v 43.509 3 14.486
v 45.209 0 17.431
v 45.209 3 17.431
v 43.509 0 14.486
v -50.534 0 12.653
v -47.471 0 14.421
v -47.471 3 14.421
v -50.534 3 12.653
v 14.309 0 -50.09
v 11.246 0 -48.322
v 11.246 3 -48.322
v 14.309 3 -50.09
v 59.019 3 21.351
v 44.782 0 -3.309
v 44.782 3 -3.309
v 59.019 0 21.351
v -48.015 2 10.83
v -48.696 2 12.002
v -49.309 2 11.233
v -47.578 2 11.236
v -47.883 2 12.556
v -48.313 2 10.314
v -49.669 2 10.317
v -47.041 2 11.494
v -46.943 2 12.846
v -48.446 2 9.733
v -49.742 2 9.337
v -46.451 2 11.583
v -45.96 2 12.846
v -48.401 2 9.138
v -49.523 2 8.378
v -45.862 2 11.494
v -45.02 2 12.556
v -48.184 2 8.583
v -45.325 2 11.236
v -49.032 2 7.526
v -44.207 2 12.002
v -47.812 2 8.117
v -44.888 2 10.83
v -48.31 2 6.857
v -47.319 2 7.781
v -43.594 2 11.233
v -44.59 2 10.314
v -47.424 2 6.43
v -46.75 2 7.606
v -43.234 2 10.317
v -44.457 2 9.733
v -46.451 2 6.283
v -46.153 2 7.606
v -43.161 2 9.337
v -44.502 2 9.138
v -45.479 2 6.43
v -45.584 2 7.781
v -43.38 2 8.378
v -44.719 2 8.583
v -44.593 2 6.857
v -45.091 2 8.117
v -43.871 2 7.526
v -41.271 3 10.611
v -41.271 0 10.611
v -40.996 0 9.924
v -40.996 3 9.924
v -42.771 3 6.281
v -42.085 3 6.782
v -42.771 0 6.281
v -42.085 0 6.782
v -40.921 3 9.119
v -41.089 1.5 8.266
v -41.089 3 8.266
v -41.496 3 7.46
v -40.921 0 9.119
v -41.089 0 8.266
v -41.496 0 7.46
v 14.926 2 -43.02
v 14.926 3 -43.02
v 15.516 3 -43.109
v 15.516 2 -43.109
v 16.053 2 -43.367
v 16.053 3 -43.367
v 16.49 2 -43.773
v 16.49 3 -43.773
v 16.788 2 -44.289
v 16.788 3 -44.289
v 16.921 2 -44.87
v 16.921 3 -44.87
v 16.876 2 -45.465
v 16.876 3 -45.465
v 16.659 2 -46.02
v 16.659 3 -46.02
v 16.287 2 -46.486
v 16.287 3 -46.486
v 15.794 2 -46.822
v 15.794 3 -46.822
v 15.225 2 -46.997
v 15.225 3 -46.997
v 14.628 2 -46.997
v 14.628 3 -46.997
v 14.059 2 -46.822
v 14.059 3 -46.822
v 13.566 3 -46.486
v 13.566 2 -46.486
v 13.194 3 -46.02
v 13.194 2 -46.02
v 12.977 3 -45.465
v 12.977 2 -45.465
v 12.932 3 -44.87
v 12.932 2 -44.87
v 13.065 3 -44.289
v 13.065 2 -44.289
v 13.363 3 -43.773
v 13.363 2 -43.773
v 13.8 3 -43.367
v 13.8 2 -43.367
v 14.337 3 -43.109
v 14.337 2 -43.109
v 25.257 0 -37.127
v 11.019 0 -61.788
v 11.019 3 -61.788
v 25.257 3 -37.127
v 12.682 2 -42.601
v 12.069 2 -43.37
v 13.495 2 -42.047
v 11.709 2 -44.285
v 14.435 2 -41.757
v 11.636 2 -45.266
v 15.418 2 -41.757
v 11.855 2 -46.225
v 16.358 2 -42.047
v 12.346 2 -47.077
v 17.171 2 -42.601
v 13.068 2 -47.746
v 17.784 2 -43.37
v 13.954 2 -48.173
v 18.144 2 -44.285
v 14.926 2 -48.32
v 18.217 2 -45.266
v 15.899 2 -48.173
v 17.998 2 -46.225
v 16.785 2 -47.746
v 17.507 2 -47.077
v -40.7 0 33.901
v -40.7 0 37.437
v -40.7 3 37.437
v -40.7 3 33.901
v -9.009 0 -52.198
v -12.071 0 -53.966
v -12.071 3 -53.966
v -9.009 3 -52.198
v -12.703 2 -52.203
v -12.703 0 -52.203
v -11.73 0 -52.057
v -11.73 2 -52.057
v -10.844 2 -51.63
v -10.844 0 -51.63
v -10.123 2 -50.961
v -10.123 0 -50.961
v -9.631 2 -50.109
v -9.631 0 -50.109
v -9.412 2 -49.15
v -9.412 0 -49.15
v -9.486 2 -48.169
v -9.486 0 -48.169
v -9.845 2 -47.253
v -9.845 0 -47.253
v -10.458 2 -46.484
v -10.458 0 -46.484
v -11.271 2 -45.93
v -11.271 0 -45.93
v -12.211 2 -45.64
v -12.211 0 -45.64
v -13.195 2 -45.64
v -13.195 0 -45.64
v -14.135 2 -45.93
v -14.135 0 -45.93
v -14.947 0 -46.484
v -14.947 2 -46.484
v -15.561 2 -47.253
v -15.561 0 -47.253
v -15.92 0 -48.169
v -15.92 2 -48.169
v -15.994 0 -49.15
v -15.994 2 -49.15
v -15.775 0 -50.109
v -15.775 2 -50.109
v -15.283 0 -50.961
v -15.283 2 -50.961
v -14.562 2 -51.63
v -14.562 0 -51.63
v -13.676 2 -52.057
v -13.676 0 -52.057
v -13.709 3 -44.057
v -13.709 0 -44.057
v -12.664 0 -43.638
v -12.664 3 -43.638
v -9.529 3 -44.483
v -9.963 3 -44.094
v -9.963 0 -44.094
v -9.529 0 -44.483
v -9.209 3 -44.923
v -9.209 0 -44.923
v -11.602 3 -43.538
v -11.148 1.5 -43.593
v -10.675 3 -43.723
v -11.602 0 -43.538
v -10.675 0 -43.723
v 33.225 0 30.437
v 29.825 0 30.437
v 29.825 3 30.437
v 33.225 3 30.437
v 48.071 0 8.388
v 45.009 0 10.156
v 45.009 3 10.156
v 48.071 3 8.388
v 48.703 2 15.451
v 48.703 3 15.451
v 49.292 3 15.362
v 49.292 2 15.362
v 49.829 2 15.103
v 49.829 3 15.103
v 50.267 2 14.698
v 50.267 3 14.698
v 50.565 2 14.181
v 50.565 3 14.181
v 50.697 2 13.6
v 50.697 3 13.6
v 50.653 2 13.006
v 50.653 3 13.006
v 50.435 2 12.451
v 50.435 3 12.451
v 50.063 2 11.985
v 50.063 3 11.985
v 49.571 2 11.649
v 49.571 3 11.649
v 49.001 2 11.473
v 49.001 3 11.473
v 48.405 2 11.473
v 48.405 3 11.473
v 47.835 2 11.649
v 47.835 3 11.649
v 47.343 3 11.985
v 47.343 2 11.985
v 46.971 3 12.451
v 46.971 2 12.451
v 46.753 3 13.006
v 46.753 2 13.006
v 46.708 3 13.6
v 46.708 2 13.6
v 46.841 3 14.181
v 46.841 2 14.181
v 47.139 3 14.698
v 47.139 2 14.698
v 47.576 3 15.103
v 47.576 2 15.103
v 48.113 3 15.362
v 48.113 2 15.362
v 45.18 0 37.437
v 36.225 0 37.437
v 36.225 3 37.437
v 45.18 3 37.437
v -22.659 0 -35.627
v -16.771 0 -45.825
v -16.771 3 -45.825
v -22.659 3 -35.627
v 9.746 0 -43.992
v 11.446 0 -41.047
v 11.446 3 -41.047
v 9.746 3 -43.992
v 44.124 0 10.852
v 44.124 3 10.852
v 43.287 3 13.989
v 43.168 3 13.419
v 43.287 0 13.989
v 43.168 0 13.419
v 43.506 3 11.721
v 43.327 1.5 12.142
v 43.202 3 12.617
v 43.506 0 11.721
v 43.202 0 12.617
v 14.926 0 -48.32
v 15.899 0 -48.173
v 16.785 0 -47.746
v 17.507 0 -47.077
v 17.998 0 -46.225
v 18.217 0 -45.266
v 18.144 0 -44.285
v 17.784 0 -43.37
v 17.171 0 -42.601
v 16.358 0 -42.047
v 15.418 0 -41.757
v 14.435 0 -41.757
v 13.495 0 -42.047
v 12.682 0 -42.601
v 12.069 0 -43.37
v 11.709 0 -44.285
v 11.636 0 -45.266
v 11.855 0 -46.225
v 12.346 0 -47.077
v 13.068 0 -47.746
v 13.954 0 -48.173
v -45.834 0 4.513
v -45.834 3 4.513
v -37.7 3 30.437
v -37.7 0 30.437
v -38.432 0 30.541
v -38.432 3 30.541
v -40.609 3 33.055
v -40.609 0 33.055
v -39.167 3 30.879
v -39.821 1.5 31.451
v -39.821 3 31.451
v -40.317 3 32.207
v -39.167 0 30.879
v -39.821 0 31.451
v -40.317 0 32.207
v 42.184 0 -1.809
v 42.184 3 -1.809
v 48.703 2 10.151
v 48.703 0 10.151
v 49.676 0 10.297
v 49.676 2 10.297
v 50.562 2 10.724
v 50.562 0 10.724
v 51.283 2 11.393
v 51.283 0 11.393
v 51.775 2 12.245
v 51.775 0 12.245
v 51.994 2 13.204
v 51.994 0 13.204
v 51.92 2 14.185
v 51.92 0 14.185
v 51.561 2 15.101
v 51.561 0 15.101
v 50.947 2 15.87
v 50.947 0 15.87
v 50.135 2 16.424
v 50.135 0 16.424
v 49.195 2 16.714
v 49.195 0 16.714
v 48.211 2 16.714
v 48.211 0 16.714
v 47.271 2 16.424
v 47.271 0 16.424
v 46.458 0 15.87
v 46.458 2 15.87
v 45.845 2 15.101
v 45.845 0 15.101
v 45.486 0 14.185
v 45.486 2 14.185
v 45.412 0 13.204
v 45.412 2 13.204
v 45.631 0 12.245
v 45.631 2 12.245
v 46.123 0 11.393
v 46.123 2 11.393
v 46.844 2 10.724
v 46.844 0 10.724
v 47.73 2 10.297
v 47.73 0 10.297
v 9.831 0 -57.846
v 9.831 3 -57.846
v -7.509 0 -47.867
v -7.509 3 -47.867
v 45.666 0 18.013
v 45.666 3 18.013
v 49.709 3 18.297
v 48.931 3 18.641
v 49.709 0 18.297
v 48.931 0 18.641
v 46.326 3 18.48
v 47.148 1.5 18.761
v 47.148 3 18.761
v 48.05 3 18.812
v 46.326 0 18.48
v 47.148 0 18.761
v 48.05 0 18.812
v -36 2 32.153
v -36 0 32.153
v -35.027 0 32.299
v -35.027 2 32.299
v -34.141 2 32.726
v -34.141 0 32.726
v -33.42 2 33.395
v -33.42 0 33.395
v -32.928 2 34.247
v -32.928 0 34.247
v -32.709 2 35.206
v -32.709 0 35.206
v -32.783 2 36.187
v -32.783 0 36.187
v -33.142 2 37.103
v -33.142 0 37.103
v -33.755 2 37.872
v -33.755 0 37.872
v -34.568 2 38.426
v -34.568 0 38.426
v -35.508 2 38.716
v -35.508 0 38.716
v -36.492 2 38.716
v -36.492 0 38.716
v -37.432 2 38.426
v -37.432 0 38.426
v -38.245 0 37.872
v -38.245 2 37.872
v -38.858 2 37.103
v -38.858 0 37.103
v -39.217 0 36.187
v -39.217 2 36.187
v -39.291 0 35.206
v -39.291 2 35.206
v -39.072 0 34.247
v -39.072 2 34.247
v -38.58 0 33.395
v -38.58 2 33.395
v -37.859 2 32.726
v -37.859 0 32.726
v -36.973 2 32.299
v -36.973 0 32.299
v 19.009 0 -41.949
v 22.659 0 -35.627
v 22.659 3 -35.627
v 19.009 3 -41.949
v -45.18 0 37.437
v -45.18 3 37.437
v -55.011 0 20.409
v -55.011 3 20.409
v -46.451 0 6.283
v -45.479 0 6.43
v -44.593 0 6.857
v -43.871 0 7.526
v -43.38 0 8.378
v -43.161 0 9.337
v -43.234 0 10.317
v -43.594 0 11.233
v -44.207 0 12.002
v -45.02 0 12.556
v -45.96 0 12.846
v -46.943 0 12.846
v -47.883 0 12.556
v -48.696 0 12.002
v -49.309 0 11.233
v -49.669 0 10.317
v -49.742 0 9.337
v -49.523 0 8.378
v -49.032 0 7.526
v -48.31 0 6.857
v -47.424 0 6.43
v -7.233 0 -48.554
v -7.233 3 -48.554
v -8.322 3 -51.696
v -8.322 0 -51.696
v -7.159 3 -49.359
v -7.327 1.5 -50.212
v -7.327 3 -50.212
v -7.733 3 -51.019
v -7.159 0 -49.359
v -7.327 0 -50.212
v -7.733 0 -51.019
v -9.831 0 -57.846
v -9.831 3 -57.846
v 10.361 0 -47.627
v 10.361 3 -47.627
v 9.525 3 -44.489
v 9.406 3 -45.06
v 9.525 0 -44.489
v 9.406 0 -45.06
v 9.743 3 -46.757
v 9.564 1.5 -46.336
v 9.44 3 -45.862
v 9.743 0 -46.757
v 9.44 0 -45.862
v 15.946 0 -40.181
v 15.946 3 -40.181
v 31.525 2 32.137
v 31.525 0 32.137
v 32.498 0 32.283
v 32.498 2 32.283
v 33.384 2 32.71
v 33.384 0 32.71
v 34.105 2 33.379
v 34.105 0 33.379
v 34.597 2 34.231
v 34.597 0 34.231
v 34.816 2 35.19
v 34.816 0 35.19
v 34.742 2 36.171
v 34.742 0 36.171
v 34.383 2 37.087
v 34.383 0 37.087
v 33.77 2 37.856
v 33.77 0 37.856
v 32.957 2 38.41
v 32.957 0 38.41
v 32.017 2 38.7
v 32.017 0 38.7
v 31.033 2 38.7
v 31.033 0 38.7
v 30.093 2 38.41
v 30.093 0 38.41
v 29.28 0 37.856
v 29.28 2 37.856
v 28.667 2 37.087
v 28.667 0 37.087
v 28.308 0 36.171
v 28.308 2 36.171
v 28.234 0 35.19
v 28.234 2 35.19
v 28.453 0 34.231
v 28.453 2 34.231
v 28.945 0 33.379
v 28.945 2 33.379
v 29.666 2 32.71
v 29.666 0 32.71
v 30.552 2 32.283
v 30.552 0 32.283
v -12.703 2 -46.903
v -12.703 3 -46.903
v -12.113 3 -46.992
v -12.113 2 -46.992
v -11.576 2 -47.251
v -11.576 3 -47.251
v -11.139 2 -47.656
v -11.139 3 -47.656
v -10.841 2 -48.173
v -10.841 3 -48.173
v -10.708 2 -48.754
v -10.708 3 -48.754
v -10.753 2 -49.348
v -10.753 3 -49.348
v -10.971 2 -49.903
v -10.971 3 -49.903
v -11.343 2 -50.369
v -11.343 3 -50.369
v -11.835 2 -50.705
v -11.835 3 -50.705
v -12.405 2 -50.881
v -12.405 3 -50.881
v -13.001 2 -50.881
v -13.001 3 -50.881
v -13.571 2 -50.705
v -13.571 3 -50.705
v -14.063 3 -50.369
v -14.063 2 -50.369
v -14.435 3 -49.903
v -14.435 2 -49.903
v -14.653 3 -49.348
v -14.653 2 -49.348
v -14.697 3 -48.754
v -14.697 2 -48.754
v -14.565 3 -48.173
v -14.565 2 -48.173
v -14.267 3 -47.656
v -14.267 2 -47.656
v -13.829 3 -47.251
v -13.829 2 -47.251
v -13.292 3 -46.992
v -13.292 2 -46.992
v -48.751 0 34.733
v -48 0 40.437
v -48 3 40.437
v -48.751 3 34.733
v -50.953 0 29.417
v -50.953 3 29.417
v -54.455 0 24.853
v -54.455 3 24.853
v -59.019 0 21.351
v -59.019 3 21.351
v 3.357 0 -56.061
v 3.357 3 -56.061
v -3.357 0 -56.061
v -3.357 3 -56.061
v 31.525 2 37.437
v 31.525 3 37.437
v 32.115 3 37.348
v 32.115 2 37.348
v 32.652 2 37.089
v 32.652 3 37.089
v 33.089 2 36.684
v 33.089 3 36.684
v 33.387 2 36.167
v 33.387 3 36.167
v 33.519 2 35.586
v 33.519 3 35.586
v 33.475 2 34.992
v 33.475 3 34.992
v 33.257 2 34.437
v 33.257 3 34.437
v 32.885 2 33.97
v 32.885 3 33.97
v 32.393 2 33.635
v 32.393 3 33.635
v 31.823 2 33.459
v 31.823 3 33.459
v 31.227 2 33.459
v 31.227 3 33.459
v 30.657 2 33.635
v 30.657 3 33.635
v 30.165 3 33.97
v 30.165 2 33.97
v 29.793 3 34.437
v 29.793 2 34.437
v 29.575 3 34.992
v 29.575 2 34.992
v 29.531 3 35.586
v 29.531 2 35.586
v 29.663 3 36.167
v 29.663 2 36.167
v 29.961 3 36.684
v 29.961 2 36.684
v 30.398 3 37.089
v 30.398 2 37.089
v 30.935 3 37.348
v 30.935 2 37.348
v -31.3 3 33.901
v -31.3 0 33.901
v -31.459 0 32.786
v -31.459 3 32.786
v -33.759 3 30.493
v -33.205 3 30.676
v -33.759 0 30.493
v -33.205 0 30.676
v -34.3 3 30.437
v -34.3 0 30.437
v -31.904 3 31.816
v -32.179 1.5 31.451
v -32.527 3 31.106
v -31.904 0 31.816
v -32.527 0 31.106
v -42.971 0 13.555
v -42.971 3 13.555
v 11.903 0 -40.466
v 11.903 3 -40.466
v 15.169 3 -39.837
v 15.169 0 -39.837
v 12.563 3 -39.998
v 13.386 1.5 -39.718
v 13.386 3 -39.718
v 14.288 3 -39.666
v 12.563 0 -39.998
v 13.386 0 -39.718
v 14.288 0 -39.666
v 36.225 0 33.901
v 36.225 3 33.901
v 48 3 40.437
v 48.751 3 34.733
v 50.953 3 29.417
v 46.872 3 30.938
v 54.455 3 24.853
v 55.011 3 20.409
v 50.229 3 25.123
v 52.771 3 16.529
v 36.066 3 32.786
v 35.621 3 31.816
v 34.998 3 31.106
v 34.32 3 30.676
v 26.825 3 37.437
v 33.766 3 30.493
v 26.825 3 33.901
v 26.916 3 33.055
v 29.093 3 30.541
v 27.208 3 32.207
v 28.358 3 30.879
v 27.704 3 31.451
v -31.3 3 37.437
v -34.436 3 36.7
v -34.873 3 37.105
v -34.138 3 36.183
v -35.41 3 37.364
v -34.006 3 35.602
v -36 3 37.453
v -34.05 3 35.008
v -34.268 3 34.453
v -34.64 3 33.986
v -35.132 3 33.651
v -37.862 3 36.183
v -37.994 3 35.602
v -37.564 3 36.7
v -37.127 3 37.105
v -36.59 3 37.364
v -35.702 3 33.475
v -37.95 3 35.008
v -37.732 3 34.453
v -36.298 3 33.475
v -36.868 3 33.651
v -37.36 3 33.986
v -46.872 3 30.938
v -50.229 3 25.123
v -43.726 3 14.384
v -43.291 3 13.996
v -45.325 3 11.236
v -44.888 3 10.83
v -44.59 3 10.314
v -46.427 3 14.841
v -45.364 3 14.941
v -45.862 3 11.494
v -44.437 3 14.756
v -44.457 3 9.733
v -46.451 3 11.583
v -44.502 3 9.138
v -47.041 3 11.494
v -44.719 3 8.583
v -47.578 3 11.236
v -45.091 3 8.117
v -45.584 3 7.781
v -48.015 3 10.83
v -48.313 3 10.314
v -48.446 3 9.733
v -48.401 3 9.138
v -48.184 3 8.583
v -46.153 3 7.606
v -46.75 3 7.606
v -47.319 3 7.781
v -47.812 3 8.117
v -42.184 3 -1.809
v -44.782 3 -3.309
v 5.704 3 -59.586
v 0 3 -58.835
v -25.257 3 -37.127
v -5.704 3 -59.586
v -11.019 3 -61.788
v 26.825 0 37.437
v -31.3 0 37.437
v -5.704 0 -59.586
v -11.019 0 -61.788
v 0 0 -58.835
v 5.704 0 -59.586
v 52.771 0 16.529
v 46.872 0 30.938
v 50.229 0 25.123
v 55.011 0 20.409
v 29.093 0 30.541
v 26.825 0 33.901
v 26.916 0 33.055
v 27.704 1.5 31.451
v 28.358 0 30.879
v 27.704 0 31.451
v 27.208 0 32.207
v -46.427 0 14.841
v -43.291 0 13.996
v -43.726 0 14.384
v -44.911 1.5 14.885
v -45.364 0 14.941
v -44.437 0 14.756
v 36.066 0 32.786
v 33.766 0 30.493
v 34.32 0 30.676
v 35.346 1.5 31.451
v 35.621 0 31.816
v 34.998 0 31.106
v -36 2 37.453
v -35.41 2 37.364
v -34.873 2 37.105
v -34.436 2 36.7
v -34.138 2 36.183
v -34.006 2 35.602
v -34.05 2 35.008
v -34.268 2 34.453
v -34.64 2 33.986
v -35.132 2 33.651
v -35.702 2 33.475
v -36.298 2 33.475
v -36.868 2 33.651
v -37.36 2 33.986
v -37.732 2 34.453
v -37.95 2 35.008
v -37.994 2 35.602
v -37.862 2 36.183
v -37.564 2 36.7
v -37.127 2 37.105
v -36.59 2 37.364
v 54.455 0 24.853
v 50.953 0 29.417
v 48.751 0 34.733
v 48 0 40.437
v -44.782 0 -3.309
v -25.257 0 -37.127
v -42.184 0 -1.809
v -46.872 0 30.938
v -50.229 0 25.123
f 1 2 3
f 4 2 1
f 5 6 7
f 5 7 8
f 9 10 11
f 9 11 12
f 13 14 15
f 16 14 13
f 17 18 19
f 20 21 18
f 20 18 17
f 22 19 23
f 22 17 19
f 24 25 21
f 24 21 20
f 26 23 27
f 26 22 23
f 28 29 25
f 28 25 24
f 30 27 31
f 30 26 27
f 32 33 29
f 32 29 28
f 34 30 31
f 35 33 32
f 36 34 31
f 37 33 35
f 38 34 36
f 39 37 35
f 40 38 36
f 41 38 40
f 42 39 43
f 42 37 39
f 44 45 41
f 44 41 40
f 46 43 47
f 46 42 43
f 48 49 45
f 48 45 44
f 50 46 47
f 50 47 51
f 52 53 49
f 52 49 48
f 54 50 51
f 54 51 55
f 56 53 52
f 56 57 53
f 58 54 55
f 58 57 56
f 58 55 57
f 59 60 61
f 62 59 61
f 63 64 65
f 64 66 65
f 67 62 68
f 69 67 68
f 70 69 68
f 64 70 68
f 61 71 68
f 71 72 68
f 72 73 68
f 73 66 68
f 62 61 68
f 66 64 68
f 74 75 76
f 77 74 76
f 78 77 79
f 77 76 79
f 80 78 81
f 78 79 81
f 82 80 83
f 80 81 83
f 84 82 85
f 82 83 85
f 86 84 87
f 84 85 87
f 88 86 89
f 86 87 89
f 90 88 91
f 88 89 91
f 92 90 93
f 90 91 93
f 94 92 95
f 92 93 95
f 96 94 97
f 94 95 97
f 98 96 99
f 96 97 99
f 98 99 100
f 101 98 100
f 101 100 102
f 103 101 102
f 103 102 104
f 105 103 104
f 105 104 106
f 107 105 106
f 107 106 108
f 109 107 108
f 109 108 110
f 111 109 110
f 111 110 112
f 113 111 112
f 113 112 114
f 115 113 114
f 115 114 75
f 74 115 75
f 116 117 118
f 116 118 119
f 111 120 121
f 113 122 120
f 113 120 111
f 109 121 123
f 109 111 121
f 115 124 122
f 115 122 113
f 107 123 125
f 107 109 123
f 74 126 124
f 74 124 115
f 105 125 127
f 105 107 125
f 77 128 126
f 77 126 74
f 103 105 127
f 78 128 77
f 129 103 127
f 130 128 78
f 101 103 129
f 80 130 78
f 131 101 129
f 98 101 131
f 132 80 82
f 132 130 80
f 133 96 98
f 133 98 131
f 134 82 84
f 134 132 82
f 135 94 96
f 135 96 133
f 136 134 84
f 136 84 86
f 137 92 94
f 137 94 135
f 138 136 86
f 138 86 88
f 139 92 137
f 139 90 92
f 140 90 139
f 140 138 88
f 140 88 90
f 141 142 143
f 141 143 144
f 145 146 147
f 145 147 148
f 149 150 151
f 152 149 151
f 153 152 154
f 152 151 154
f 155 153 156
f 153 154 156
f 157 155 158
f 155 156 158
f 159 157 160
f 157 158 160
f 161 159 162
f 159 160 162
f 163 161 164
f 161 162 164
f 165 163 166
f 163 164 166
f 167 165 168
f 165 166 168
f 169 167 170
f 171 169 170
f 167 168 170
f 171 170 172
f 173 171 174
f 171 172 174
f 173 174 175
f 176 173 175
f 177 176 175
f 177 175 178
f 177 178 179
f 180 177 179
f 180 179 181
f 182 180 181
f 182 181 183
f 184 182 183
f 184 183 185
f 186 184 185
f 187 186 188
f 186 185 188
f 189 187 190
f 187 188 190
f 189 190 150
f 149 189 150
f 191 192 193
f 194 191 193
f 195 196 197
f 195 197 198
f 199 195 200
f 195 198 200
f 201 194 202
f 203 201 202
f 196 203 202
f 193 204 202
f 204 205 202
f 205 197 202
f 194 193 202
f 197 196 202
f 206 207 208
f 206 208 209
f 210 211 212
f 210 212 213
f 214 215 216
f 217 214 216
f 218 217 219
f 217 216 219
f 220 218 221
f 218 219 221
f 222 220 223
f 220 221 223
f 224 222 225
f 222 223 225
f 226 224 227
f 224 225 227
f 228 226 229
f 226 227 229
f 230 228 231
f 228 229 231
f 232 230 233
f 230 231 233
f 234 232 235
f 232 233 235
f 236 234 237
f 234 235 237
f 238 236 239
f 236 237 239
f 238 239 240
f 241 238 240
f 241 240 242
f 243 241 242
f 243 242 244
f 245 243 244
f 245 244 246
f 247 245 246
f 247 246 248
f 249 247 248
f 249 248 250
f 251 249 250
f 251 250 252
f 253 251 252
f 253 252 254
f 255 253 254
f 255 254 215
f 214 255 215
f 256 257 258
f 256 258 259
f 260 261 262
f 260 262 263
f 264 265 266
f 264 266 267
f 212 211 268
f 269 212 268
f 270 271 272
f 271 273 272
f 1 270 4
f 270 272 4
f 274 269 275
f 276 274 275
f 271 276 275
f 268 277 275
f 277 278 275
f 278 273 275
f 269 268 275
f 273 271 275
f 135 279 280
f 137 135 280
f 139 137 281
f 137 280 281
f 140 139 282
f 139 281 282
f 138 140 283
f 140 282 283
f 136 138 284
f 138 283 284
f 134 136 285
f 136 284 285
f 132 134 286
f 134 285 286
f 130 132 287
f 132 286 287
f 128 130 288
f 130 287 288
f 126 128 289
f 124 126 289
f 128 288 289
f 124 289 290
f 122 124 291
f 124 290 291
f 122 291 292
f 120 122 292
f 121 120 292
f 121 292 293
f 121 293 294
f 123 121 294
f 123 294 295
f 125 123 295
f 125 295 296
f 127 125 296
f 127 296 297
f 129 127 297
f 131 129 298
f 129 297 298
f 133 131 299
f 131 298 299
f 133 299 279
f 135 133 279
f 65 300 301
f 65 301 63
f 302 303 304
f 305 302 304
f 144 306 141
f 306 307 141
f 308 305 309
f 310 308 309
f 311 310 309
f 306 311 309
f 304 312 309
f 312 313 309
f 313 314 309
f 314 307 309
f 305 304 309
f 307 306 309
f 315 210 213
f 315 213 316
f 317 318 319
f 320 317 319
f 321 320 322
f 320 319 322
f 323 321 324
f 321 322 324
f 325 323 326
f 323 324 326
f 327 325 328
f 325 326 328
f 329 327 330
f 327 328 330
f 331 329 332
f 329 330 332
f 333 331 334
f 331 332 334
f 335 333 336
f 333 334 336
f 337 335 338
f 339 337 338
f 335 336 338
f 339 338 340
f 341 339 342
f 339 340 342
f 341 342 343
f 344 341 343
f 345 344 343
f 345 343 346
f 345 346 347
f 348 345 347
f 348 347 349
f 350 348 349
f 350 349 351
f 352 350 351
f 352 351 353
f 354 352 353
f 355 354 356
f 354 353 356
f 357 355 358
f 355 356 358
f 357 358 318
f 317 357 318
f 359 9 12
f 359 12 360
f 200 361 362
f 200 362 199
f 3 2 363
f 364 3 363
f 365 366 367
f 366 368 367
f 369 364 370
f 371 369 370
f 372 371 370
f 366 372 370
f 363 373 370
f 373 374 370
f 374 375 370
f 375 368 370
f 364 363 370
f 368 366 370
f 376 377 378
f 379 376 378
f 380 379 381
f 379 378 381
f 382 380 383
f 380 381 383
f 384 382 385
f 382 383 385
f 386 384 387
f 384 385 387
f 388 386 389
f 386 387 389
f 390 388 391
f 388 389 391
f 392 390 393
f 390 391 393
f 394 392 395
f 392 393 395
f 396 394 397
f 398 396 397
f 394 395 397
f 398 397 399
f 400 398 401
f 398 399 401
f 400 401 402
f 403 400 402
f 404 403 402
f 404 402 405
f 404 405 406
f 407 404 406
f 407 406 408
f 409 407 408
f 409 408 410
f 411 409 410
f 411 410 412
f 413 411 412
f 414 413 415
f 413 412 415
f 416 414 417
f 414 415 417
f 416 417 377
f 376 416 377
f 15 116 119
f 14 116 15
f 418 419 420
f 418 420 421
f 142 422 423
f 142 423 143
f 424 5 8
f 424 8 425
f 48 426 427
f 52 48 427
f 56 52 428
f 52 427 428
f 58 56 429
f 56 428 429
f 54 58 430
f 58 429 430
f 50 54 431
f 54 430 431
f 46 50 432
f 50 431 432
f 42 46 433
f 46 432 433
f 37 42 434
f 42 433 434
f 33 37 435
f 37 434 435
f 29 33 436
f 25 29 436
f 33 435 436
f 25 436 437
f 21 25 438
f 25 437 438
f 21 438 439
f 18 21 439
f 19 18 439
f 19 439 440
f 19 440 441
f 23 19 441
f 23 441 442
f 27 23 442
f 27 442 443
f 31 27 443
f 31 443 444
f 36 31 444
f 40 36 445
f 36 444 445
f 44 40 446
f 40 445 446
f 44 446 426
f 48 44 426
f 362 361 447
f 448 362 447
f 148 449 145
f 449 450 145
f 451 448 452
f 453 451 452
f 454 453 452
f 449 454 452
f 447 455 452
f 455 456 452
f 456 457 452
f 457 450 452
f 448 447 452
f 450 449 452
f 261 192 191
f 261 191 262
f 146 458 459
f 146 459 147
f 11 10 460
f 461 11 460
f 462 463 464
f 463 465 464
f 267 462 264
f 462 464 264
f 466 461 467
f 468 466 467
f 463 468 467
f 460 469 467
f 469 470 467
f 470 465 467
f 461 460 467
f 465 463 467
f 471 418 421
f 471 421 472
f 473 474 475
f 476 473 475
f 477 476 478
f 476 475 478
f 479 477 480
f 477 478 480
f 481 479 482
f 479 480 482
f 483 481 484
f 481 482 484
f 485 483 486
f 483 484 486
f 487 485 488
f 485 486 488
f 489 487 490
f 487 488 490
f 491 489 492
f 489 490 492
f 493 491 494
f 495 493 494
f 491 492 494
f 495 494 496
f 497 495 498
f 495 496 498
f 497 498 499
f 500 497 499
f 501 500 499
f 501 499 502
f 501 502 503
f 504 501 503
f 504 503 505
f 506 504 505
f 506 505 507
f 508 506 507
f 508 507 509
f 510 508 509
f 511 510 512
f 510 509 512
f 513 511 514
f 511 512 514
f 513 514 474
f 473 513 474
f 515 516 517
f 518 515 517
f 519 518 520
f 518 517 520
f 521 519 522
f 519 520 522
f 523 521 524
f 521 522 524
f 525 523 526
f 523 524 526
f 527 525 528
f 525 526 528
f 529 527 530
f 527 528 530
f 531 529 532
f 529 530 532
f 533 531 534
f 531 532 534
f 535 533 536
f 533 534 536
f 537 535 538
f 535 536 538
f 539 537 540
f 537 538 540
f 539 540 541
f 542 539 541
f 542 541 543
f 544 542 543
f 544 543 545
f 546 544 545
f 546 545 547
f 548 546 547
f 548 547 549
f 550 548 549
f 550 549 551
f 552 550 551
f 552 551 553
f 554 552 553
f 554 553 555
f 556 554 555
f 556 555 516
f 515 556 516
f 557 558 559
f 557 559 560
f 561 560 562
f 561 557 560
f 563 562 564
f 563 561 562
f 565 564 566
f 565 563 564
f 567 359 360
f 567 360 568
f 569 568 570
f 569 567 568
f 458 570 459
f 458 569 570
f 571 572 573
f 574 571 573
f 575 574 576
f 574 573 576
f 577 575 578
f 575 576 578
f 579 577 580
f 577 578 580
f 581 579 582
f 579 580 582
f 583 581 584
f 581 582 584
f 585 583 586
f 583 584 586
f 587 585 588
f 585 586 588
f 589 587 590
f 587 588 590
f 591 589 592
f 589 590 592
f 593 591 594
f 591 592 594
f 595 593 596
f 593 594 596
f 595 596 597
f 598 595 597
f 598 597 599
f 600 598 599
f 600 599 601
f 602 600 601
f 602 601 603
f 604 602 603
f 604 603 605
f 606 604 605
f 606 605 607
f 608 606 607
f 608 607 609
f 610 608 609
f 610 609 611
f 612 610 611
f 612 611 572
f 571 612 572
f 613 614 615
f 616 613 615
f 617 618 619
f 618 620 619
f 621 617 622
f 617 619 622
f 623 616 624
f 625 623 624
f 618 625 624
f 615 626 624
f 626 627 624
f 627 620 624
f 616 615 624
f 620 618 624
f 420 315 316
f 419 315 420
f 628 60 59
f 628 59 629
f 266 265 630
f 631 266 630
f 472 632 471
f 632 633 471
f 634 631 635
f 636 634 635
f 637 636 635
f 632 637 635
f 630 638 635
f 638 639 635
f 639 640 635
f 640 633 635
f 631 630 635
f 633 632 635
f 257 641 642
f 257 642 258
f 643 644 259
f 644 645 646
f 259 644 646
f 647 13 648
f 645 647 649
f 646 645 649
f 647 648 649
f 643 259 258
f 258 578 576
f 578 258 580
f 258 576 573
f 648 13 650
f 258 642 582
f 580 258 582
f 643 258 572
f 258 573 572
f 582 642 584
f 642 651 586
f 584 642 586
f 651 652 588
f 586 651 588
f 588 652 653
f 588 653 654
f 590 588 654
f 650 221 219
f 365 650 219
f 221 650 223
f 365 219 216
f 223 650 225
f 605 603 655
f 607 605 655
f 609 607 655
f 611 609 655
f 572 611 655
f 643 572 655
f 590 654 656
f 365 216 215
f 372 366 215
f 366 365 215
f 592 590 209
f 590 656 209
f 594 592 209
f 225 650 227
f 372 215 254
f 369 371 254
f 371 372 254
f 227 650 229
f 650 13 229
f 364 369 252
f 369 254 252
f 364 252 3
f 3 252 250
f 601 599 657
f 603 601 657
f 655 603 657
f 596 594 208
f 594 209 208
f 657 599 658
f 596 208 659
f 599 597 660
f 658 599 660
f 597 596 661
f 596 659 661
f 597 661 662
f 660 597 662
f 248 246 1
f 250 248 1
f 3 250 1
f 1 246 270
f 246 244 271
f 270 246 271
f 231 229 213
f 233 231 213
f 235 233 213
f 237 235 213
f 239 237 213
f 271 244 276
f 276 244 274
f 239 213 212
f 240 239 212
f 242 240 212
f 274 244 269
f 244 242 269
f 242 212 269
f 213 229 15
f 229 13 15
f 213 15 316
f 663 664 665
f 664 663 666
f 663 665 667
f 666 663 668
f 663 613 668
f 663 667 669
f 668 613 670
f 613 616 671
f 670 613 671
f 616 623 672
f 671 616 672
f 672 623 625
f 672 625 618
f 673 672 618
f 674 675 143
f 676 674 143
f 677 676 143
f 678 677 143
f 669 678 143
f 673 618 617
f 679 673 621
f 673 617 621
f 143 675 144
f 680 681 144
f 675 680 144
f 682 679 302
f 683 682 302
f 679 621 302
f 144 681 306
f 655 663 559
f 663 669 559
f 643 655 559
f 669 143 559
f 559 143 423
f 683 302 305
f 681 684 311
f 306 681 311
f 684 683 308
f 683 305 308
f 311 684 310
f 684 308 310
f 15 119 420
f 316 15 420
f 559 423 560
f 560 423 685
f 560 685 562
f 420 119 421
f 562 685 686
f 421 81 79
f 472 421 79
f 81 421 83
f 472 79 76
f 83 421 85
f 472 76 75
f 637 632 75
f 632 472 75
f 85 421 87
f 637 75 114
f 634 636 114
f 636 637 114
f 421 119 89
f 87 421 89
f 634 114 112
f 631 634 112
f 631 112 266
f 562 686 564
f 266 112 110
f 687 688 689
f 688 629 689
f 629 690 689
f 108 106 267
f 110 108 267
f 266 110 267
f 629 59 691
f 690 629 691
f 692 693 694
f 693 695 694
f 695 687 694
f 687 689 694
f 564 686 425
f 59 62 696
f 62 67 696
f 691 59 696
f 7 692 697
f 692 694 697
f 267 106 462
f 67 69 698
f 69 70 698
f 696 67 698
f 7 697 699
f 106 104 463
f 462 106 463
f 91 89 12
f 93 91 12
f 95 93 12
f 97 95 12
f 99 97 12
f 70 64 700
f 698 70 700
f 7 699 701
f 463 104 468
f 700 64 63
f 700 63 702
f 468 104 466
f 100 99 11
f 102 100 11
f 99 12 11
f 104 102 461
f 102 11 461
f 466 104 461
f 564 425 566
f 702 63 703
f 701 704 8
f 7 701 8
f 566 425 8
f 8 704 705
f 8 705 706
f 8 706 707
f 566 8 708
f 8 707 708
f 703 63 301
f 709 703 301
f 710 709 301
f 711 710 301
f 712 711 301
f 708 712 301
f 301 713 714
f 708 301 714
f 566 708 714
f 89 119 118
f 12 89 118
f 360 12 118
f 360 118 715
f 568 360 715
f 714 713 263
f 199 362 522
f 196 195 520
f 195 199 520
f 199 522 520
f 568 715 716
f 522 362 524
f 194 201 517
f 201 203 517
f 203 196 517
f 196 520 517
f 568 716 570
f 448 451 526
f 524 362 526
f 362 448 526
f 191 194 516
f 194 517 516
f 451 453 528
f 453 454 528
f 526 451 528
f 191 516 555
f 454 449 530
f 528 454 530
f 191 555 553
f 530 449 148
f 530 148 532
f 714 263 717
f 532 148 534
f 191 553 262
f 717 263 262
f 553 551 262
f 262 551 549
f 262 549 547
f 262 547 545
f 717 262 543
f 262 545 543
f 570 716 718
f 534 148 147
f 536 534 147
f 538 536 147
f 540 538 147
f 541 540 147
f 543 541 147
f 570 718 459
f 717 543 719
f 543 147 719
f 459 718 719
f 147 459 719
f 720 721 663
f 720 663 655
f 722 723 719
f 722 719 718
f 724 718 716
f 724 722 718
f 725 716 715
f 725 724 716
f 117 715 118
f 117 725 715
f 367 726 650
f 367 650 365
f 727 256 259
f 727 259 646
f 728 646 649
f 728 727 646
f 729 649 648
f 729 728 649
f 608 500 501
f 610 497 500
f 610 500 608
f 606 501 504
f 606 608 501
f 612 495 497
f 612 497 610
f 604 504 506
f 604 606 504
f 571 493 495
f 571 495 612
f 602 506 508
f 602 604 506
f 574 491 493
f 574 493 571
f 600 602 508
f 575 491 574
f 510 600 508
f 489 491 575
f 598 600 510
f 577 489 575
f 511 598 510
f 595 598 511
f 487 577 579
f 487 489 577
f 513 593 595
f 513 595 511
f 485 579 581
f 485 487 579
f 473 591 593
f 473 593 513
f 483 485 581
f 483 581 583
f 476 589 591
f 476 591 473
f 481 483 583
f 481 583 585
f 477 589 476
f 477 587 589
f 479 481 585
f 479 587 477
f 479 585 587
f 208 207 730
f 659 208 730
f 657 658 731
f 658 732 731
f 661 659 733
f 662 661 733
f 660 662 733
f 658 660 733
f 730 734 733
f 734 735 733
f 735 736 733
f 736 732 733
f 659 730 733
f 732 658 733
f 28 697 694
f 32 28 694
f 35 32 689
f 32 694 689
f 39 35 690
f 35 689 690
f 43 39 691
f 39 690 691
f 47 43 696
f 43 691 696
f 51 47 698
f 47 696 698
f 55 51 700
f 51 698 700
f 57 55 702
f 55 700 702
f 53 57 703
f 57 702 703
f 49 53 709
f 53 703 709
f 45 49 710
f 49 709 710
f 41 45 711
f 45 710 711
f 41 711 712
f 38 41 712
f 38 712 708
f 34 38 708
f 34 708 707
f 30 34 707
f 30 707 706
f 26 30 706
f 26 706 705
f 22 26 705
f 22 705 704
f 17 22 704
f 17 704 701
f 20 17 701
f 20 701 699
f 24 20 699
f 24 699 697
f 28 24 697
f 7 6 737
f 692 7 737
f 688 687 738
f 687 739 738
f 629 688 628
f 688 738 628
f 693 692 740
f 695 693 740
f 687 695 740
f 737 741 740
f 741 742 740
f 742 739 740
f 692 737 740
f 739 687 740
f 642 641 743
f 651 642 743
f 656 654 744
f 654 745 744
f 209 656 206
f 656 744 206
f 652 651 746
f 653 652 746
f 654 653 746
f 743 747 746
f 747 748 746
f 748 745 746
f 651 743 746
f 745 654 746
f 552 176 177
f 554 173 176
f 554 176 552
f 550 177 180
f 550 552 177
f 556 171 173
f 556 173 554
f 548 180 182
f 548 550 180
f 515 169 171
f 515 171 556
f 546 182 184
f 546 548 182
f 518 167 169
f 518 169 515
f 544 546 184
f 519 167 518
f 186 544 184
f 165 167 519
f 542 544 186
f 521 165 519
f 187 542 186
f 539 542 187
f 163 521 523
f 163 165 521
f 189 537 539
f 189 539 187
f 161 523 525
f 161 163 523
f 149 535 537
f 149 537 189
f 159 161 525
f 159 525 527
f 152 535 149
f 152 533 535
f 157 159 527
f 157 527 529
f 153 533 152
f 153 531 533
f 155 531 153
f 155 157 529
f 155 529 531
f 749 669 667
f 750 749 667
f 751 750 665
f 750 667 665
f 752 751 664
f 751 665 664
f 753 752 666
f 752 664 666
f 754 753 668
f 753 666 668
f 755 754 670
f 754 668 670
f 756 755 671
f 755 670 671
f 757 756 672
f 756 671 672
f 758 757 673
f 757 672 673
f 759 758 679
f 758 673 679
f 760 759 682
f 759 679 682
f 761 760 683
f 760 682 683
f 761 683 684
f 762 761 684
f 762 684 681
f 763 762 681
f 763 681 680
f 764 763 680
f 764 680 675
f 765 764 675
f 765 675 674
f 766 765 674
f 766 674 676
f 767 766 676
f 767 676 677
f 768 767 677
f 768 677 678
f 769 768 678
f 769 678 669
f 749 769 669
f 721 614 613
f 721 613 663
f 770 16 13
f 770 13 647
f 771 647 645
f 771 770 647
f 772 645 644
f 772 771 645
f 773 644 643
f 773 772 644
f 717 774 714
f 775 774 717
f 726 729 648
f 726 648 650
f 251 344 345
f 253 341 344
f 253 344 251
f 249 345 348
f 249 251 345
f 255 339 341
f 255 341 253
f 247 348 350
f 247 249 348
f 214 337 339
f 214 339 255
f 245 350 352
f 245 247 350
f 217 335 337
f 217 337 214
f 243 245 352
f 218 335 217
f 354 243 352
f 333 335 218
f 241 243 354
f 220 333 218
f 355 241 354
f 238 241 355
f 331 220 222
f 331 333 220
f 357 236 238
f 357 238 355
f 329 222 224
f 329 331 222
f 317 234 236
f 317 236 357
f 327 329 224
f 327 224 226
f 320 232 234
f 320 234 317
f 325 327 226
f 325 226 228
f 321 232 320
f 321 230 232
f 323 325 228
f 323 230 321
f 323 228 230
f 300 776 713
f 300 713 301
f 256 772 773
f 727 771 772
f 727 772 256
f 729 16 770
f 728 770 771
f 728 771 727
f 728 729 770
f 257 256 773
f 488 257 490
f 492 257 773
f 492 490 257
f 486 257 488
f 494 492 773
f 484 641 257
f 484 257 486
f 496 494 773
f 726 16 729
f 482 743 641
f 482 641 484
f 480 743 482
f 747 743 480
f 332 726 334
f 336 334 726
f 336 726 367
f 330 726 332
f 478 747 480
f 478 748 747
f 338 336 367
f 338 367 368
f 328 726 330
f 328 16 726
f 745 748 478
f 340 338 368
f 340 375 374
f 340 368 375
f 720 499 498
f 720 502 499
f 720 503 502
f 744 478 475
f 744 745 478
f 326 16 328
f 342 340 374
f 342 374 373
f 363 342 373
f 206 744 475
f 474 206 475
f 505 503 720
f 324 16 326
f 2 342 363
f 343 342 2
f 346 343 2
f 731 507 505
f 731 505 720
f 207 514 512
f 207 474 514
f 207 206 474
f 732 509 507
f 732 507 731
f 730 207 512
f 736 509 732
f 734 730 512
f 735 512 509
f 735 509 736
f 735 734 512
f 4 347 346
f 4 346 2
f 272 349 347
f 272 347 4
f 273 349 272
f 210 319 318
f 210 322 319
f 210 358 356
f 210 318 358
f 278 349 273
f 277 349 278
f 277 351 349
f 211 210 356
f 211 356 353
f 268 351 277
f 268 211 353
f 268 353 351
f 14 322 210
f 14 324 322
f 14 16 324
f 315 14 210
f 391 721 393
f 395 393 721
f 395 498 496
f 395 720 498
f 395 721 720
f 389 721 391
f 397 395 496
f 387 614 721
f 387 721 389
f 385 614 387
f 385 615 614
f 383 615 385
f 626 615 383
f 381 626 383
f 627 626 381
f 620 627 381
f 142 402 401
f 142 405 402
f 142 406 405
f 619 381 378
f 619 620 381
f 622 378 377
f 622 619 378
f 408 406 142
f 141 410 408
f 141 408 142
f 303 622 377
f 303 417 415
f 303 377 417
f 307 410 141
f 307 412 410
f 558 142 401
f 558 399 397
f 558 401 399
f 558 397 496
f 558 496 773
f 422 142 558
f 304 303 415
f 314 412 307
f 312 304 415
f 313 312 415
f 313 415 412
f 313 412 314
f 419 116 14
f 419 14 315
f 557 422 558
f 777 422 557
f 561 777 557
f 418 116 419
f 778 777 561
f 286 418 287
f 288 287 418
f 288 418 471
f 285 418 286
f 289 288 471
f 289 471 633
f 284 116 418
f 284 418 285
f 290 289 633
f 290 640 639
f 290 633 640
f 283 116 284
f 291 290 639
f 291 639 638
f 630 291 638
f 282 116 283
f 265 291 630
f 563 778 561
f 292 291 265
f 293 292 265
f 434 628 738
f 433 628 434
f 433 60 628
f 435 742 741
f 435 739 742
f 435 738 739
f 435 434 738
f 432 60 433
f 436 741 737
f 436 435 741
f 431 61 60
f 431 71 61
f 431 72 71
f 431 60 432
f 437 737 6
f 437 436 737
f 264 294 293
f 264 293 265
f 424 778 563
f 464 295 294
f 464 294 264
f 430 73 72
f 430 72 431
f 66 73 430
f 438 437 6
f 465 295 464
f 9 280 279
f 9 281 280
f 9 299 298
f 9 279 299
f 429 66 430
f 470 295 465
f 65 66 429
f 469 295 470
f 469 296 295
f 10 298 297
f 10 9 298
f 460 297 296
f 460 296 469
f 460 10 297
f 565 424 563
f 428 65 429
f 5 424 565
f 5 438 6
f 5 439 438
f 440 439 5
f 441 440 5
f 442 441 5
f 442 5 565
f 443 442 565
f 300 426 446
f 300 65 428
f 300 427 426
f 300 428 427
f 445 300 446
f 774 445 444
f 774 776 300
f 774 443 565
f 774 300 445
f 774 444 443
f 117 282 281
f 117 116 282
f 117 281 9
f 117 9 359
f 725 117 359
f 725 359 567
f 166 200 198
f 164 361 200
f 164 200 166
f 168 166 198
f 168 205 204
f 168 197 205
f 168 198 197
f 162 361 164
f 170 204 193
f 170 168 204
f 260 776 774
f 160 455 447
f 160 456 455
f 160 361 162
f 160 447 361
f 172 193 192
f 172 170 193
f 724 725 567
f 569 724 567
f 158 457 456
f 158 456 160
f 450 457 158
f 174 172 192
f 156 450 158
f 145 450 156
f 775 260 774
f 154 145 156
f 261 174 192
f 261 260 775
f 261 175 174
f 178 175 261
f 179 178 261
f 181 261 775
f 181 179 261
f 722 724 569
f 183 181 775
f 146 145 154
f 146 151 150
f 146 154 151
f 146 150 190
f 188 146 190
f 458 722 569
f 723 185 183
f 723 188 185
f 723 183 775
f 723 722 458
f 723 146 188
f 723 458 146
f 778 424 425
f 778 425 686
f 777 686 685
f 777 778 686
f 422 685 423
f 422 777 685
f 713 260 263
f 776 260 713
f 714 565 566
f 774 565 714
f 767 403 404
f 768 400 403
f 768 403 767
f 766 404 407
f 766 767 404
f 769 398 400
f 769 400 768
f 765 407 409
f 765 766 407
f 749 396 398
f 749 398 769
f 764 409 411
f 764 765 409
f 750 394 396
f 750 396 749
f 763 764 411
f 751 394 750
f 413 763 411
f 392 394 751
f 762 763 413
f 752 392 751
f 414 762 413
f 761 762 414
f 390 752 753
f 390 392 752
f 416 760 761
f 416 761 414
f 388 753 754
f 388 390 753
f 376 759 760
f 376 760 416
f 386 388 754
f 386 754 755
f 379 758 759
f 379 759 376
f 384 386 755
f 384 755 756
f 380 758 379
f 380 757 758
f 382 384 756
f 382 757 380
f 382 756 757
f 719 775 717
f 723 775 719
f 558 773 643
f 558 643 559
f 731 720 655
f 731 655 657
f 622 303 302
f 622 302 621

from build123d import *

# Parameters (mm, degrees)
BOSS_EXTRUDE2_DEPTH = 3
SKETCH3_R           = 2
CUT_EXTRUDE1_DEPTH  = 86.498243834
SKETCH5_R           = 3.3
CUT_EXTRUDE3_DEPTH  = 2


with BuildPart() as part:
    # Sketch2 → Boss-Extrude2 (new body)
    with BuildSketch(Plane(origin=(0, 0, 0), x_dir=(1, 0, 0), z_dir=(0, 1, 0))):
        with BuildLine():
            Line((-19.525, -40.436571109), (-48, -40.436571109))
            ThreePointArc((-48, -40.436571109), (-50.952558363, -29.417473287), (-59.019097822, -21.350933827))
            Line((-59.019097822, -21.350933827), (-44.781597822, 3.309139546))
            Line((-44.781597822, 3.309139546), (-25.256597822, 37.127431563))
            Line((-25.256597822, 37.127431563), (-11.019097822, 61.787504936))
            ThreePointArc((-11.019097822, 61.787504936), (0, 58.834946573), (11.019097822, 61.787504936))
            Line((11.019097822, 61.787504936), (25.256597822, 37.127431563))
            Line((25.256597822, 37.127431563), (44.781597822, 3.309139546))
            Line((44.781597822, 3.309139546), (59.019097822, -21.350933827))
            ThreePointArc((59.019097822, -21.350933827), (50.952558363, -29.417473287), (48, -40.436571109))
            Line((48, -40.436571109), (19.525, -40.436571109))
            Line((19.525, -40.436571109), (-19.525, -40.436571109))
        make_face()
        with BuildLine():
            Line((-40.7, -37.436571109), (-40.7, -33.900672724))
            add(Edge.make_bspline(
                [(-37.7, -30.436571109), (-40.7, -30.436571109), (-40.7, -33.900672724)],
                knots=[0, 0, 0, 1.570796327, 1.570796327, 1.570796327], degree=2, weights=[1, 0.707106781, 1]))
            Line((-37.7, -30.436571109), (-34.3, -30.436571109))
            add(Edge.make_bspline(
                [(-31.3, -33.900672724), (-31.3, -30.436571109), (-34.3, -30.436571109)],
                knots=[4.71238898, 4.71238898, 4.71238898, 6.283185307, 6.283185307, 6.283185307], degree=2, weights=[1, 0.707106781, 1]))
            Line((-31.3, -33.900672724), (-31.3, -37.436571109))
            Line((-31.3, -37.436571109), (-19.525, -37.436571109))
            Line((-19.525, -37.436571109), (19.525, -37.436571109))
            Line((19.525, -37.436571109), (26.825, -37.436571109))
            Line((26.825, -37.436571109), (26.825, -33.900672724))
            add(Edge.make_bspline(
                [(29.825, -30.436571109), (26.825, -30.436571109), (26.825, -33.900672724)],
                knots=[3.141592654, 3.141592654, 3.141592654, 4.71238898, 4.71238898, 4.71238898], degree=2, weights=[1, 0.707106781, 1]))
            Line((29.825, -30.436571109), (33.225, -30.436571109))
            add(Edge.make_bspline(
                [(36.225, -33.900672724), (36.225, -30.436571109), (33.225, -30.436571109)],
                knots=[1.570796327, 1.570796327, 1.570796327, 3.141592654, 3.141592654, 3.141592654], degree=2, weights=[1, 0.707106781, 1]))
            Line((36.225, -33.900672724), (36.225, -37.436571109))
            Line((36.225, -37.436571109), (45.180375122, -37.436571109))
            ThreePointArc((45.180375122, -37.436571109), (48.354482151, -27.917473287), (55.011209172, -20.409067054))
            Line((55.011209172, -20.409067054), (52.771021611, -16.528948379))
            Line((52.771021611, -16.528948379), (49.708843785, -18.296897572))
            add(Edge.make_bspline(
                [(45.208843785, -17.430872168), (46.708843785, -20.028948379), (49.708843785, -18.296897572)],
                knots=[0, 0, 0, 1.570796327, 1.570796327, 1.570796327], degree=2, weights=[1, 0.707106781, 1]))
            Line((45.208843785, -17.430872168), (43.508843785, -14.486385795))
            add(Edge.make_bspline(
                [(45.008843785, -10.156258776), (42.008843785, -11.888309584), (43.508843785, -14.486385795)],
                knots=[4.71238898, 4.71238898, 4.71238898, 6.283185307, 6.283185307, 6.283185307], degree=2, weights=[1, 0.707106781, 1]))
            Line((45.008843785, -10.156258776), (48.071021611, -8.388309584))
            Line((48.071021611, -8.388309584), (42.183521611, 1.809139546))
            Line((42.183521611, 1.809139546), (22.658521611, 35.627431563))
            Line((22.658521611, 35.627431563), (19.008521611, 41.949417011))
            Line((19.008521611, 41.949417011), (15.946343785, 40.181467819))
            add(Edge.make_bspline(
                [(11.446343785, 41.047493222), (12.946343785, 38.449417011), (15.946343785, 40.181467819)],
                knots=[3.141592654, 3.141592654, 3.141592654, 4.71238898, 4.71238898, 4.71238898], degree=2, weights=[1, 0.707106781, 1]))
            Line((11.446343785, 41.047493222), (9.746343785, 43.991979595))
            add(Edge.make_bspline(
                [(11.246343785, 48.322106614), (8.246343785, 46.590055807), (9.746343785, 43.991979595)],
                knots=[1.570796327, 1.570796327, 1.570796327, 3.141592654, 3.141592654, 3.141592654], degree=2, weights=[1, 0.707106781, 1]))
            Line((11.246343785, 48.322106614), (14.308521611, 50.090055807))
            Line((14.308521611, 50.090055807), (9.83083405, 57.845638163))
            ThreePointArc((9.83083405, 57.845638163), (0, 55.834946573), (-9.83083405, 57.845638163))
            Line((-9.83083405, 57.845638163), (-12.071021611, 53.965519489))
            Line((-12.071021611, 53.965519489), (-9.008843785, 52.197570296))
            add(Edge.make_bspline(
                [(-7.508843785, 47.867443277), (-6.008843785, 50.465519489), (-9.008843785, 52.197570296)],
                knots=[0, 0, 0, 1.570796327, 1.570796327, 1.570796327], degree=2, weights=[1, 0.707106781, 1]))
            Line((-7.508843785, 47.867443277), (-9.208843785, 44.922956904))
            add(Edge.make_bspline(
                [(-13.708843785, 44.056931501), (-10.708843785, 42.324880693), (-9.208843785, 44.922956904)],
                knots=[4.71238898, 4.71238898, 4.71238898, 6.283185307, 6.283185307, 6.283185307], degree=2, weights=[1, 0.707106781, 1]))
            Line((-13.708843785, 44.056931501), (-16.771021611, 45.824880693))
            Line((-16.771021611, 45.824880693), (-22.658521611, 35.627431563))
            Line((-22.658521611, 35.627431563), (-42.183521611, 1.809139546))
            Line((-42.183521611, 1.809139546), (-45.833521611, -4.512845902))
            Line((-45.833521611, -4.512845902), (-42.771343785, -6.280795094))
            add(Edge.make_bspline(
                [(-41.271343785, -10.610922113), (-39.771343785, -8.012845902), (-42.771343785, -6.280795094)],
                knots=[3.141592654, 3.141592654, 3.141592654, 4.71238898, 4.71238898, 4.71238898], degree=2, weights=[1, 0.707106781, 1]))
            Line((-41.271343785, -10.610922113), (-42.971343785, -13.555408486))
            add(Edge.make_bspline(
                [(-47.471343785, -14.42143389), (-44.471343785, -16.153484698), (-42.971343785, -13.555408486)],
                knots=[1.570796327, 1.570796327, 1.570796327, 3.141592654, 3.141592654, 3.141592654], degree=2, weights=[1, 0.707106781, 1]))
            Line((-47.471343785, -14.42143389), (-50.533521611, -12.653484698))
            Line((-50.533521611, -12.653484698), (-55.011209172, -20.409067054))
            ThreePointArc((-55.011209172, -20.409067054), (-48.354482151, -27.917473287), (-45.180375122, -37.436571109))
            Line((-45.180375122, -37.436571109), (-40.7, -37.436571109))
        make_face(mode=Mode.SUBTRACT)
    extrude(amount=BOSS_EXTRUDE2_DEPTH)

    # Sketch3 → Cut-Extrude1 (cut, through all)
    with BuildSketch(Plane(origin=(0, 3, 0), x_dir=(1, 0, 0), z_dir=(0, 1, 0))):
        with Locations(Location((31.525, -35.436571109, 0), (0, 0, 270))):
            Circle(SKETCH3_R)
        with Locations(Location((-36, -35.452596513, 0), (0, 0, 270))):
            Circle(SKETCH3_R)
        with Locations(Location((-46.451470804, -9.5831653, 0), (0, 0, 270))):
            Circle(SKETCH3_R)
        with Locations(Location((48.70284921, -13.45061628, 0), (0, 0, 270))):
            Circle(SKETCH3_R)
        with Locations(Location((14.926470804, 45.019736409, 0), (0, 0, 270))):
            Circle(SKETCH3_R)
        with Locations(Location((-12.70284921, 48.903212793, 0), (0, 0, 270))):
            Circle(SKETCH3_R)
    extrude(amount=-CUT_EXTRUDE1_DEPTH, mode=Mode.SUBTRACT)

    # Sketch5 → Cut-Extrude3 (cut)
    with BuildSketch(Plane.XZ):
        with Locations(Location((48.70284921, 13.45061628, 0), (0, 0, 270))):
            Circle(SKETCH5_R)
        with Locations(Location((31.525, 35.436571109, 0), (0, 0, 270))):
            Circle(SKETCH5_R)
        with Locations(Location((-12.70284921, -48.903212793, 0), (0, 0, 270))):
            Circle(SKETCH5_R)
        with Locations(Location((14.926470804, -45.019736409, 0), (0, 0, 270))):
            Circle(SKETCH5_R)
        with Locations(Location((-36, 35.452596513, 0), (0, 0, 270))):
            Circle(SKETCH5_R)
        with Locations(Location((-46.451470804, 9.5831653, 0), (0, 0, 270))):
            Circle(SKETCH5_R)
    extrude(amount=-CUT_EXTRUDE3_DEPTH, mode=Mode.SUBTRACT)


solid = part.part
